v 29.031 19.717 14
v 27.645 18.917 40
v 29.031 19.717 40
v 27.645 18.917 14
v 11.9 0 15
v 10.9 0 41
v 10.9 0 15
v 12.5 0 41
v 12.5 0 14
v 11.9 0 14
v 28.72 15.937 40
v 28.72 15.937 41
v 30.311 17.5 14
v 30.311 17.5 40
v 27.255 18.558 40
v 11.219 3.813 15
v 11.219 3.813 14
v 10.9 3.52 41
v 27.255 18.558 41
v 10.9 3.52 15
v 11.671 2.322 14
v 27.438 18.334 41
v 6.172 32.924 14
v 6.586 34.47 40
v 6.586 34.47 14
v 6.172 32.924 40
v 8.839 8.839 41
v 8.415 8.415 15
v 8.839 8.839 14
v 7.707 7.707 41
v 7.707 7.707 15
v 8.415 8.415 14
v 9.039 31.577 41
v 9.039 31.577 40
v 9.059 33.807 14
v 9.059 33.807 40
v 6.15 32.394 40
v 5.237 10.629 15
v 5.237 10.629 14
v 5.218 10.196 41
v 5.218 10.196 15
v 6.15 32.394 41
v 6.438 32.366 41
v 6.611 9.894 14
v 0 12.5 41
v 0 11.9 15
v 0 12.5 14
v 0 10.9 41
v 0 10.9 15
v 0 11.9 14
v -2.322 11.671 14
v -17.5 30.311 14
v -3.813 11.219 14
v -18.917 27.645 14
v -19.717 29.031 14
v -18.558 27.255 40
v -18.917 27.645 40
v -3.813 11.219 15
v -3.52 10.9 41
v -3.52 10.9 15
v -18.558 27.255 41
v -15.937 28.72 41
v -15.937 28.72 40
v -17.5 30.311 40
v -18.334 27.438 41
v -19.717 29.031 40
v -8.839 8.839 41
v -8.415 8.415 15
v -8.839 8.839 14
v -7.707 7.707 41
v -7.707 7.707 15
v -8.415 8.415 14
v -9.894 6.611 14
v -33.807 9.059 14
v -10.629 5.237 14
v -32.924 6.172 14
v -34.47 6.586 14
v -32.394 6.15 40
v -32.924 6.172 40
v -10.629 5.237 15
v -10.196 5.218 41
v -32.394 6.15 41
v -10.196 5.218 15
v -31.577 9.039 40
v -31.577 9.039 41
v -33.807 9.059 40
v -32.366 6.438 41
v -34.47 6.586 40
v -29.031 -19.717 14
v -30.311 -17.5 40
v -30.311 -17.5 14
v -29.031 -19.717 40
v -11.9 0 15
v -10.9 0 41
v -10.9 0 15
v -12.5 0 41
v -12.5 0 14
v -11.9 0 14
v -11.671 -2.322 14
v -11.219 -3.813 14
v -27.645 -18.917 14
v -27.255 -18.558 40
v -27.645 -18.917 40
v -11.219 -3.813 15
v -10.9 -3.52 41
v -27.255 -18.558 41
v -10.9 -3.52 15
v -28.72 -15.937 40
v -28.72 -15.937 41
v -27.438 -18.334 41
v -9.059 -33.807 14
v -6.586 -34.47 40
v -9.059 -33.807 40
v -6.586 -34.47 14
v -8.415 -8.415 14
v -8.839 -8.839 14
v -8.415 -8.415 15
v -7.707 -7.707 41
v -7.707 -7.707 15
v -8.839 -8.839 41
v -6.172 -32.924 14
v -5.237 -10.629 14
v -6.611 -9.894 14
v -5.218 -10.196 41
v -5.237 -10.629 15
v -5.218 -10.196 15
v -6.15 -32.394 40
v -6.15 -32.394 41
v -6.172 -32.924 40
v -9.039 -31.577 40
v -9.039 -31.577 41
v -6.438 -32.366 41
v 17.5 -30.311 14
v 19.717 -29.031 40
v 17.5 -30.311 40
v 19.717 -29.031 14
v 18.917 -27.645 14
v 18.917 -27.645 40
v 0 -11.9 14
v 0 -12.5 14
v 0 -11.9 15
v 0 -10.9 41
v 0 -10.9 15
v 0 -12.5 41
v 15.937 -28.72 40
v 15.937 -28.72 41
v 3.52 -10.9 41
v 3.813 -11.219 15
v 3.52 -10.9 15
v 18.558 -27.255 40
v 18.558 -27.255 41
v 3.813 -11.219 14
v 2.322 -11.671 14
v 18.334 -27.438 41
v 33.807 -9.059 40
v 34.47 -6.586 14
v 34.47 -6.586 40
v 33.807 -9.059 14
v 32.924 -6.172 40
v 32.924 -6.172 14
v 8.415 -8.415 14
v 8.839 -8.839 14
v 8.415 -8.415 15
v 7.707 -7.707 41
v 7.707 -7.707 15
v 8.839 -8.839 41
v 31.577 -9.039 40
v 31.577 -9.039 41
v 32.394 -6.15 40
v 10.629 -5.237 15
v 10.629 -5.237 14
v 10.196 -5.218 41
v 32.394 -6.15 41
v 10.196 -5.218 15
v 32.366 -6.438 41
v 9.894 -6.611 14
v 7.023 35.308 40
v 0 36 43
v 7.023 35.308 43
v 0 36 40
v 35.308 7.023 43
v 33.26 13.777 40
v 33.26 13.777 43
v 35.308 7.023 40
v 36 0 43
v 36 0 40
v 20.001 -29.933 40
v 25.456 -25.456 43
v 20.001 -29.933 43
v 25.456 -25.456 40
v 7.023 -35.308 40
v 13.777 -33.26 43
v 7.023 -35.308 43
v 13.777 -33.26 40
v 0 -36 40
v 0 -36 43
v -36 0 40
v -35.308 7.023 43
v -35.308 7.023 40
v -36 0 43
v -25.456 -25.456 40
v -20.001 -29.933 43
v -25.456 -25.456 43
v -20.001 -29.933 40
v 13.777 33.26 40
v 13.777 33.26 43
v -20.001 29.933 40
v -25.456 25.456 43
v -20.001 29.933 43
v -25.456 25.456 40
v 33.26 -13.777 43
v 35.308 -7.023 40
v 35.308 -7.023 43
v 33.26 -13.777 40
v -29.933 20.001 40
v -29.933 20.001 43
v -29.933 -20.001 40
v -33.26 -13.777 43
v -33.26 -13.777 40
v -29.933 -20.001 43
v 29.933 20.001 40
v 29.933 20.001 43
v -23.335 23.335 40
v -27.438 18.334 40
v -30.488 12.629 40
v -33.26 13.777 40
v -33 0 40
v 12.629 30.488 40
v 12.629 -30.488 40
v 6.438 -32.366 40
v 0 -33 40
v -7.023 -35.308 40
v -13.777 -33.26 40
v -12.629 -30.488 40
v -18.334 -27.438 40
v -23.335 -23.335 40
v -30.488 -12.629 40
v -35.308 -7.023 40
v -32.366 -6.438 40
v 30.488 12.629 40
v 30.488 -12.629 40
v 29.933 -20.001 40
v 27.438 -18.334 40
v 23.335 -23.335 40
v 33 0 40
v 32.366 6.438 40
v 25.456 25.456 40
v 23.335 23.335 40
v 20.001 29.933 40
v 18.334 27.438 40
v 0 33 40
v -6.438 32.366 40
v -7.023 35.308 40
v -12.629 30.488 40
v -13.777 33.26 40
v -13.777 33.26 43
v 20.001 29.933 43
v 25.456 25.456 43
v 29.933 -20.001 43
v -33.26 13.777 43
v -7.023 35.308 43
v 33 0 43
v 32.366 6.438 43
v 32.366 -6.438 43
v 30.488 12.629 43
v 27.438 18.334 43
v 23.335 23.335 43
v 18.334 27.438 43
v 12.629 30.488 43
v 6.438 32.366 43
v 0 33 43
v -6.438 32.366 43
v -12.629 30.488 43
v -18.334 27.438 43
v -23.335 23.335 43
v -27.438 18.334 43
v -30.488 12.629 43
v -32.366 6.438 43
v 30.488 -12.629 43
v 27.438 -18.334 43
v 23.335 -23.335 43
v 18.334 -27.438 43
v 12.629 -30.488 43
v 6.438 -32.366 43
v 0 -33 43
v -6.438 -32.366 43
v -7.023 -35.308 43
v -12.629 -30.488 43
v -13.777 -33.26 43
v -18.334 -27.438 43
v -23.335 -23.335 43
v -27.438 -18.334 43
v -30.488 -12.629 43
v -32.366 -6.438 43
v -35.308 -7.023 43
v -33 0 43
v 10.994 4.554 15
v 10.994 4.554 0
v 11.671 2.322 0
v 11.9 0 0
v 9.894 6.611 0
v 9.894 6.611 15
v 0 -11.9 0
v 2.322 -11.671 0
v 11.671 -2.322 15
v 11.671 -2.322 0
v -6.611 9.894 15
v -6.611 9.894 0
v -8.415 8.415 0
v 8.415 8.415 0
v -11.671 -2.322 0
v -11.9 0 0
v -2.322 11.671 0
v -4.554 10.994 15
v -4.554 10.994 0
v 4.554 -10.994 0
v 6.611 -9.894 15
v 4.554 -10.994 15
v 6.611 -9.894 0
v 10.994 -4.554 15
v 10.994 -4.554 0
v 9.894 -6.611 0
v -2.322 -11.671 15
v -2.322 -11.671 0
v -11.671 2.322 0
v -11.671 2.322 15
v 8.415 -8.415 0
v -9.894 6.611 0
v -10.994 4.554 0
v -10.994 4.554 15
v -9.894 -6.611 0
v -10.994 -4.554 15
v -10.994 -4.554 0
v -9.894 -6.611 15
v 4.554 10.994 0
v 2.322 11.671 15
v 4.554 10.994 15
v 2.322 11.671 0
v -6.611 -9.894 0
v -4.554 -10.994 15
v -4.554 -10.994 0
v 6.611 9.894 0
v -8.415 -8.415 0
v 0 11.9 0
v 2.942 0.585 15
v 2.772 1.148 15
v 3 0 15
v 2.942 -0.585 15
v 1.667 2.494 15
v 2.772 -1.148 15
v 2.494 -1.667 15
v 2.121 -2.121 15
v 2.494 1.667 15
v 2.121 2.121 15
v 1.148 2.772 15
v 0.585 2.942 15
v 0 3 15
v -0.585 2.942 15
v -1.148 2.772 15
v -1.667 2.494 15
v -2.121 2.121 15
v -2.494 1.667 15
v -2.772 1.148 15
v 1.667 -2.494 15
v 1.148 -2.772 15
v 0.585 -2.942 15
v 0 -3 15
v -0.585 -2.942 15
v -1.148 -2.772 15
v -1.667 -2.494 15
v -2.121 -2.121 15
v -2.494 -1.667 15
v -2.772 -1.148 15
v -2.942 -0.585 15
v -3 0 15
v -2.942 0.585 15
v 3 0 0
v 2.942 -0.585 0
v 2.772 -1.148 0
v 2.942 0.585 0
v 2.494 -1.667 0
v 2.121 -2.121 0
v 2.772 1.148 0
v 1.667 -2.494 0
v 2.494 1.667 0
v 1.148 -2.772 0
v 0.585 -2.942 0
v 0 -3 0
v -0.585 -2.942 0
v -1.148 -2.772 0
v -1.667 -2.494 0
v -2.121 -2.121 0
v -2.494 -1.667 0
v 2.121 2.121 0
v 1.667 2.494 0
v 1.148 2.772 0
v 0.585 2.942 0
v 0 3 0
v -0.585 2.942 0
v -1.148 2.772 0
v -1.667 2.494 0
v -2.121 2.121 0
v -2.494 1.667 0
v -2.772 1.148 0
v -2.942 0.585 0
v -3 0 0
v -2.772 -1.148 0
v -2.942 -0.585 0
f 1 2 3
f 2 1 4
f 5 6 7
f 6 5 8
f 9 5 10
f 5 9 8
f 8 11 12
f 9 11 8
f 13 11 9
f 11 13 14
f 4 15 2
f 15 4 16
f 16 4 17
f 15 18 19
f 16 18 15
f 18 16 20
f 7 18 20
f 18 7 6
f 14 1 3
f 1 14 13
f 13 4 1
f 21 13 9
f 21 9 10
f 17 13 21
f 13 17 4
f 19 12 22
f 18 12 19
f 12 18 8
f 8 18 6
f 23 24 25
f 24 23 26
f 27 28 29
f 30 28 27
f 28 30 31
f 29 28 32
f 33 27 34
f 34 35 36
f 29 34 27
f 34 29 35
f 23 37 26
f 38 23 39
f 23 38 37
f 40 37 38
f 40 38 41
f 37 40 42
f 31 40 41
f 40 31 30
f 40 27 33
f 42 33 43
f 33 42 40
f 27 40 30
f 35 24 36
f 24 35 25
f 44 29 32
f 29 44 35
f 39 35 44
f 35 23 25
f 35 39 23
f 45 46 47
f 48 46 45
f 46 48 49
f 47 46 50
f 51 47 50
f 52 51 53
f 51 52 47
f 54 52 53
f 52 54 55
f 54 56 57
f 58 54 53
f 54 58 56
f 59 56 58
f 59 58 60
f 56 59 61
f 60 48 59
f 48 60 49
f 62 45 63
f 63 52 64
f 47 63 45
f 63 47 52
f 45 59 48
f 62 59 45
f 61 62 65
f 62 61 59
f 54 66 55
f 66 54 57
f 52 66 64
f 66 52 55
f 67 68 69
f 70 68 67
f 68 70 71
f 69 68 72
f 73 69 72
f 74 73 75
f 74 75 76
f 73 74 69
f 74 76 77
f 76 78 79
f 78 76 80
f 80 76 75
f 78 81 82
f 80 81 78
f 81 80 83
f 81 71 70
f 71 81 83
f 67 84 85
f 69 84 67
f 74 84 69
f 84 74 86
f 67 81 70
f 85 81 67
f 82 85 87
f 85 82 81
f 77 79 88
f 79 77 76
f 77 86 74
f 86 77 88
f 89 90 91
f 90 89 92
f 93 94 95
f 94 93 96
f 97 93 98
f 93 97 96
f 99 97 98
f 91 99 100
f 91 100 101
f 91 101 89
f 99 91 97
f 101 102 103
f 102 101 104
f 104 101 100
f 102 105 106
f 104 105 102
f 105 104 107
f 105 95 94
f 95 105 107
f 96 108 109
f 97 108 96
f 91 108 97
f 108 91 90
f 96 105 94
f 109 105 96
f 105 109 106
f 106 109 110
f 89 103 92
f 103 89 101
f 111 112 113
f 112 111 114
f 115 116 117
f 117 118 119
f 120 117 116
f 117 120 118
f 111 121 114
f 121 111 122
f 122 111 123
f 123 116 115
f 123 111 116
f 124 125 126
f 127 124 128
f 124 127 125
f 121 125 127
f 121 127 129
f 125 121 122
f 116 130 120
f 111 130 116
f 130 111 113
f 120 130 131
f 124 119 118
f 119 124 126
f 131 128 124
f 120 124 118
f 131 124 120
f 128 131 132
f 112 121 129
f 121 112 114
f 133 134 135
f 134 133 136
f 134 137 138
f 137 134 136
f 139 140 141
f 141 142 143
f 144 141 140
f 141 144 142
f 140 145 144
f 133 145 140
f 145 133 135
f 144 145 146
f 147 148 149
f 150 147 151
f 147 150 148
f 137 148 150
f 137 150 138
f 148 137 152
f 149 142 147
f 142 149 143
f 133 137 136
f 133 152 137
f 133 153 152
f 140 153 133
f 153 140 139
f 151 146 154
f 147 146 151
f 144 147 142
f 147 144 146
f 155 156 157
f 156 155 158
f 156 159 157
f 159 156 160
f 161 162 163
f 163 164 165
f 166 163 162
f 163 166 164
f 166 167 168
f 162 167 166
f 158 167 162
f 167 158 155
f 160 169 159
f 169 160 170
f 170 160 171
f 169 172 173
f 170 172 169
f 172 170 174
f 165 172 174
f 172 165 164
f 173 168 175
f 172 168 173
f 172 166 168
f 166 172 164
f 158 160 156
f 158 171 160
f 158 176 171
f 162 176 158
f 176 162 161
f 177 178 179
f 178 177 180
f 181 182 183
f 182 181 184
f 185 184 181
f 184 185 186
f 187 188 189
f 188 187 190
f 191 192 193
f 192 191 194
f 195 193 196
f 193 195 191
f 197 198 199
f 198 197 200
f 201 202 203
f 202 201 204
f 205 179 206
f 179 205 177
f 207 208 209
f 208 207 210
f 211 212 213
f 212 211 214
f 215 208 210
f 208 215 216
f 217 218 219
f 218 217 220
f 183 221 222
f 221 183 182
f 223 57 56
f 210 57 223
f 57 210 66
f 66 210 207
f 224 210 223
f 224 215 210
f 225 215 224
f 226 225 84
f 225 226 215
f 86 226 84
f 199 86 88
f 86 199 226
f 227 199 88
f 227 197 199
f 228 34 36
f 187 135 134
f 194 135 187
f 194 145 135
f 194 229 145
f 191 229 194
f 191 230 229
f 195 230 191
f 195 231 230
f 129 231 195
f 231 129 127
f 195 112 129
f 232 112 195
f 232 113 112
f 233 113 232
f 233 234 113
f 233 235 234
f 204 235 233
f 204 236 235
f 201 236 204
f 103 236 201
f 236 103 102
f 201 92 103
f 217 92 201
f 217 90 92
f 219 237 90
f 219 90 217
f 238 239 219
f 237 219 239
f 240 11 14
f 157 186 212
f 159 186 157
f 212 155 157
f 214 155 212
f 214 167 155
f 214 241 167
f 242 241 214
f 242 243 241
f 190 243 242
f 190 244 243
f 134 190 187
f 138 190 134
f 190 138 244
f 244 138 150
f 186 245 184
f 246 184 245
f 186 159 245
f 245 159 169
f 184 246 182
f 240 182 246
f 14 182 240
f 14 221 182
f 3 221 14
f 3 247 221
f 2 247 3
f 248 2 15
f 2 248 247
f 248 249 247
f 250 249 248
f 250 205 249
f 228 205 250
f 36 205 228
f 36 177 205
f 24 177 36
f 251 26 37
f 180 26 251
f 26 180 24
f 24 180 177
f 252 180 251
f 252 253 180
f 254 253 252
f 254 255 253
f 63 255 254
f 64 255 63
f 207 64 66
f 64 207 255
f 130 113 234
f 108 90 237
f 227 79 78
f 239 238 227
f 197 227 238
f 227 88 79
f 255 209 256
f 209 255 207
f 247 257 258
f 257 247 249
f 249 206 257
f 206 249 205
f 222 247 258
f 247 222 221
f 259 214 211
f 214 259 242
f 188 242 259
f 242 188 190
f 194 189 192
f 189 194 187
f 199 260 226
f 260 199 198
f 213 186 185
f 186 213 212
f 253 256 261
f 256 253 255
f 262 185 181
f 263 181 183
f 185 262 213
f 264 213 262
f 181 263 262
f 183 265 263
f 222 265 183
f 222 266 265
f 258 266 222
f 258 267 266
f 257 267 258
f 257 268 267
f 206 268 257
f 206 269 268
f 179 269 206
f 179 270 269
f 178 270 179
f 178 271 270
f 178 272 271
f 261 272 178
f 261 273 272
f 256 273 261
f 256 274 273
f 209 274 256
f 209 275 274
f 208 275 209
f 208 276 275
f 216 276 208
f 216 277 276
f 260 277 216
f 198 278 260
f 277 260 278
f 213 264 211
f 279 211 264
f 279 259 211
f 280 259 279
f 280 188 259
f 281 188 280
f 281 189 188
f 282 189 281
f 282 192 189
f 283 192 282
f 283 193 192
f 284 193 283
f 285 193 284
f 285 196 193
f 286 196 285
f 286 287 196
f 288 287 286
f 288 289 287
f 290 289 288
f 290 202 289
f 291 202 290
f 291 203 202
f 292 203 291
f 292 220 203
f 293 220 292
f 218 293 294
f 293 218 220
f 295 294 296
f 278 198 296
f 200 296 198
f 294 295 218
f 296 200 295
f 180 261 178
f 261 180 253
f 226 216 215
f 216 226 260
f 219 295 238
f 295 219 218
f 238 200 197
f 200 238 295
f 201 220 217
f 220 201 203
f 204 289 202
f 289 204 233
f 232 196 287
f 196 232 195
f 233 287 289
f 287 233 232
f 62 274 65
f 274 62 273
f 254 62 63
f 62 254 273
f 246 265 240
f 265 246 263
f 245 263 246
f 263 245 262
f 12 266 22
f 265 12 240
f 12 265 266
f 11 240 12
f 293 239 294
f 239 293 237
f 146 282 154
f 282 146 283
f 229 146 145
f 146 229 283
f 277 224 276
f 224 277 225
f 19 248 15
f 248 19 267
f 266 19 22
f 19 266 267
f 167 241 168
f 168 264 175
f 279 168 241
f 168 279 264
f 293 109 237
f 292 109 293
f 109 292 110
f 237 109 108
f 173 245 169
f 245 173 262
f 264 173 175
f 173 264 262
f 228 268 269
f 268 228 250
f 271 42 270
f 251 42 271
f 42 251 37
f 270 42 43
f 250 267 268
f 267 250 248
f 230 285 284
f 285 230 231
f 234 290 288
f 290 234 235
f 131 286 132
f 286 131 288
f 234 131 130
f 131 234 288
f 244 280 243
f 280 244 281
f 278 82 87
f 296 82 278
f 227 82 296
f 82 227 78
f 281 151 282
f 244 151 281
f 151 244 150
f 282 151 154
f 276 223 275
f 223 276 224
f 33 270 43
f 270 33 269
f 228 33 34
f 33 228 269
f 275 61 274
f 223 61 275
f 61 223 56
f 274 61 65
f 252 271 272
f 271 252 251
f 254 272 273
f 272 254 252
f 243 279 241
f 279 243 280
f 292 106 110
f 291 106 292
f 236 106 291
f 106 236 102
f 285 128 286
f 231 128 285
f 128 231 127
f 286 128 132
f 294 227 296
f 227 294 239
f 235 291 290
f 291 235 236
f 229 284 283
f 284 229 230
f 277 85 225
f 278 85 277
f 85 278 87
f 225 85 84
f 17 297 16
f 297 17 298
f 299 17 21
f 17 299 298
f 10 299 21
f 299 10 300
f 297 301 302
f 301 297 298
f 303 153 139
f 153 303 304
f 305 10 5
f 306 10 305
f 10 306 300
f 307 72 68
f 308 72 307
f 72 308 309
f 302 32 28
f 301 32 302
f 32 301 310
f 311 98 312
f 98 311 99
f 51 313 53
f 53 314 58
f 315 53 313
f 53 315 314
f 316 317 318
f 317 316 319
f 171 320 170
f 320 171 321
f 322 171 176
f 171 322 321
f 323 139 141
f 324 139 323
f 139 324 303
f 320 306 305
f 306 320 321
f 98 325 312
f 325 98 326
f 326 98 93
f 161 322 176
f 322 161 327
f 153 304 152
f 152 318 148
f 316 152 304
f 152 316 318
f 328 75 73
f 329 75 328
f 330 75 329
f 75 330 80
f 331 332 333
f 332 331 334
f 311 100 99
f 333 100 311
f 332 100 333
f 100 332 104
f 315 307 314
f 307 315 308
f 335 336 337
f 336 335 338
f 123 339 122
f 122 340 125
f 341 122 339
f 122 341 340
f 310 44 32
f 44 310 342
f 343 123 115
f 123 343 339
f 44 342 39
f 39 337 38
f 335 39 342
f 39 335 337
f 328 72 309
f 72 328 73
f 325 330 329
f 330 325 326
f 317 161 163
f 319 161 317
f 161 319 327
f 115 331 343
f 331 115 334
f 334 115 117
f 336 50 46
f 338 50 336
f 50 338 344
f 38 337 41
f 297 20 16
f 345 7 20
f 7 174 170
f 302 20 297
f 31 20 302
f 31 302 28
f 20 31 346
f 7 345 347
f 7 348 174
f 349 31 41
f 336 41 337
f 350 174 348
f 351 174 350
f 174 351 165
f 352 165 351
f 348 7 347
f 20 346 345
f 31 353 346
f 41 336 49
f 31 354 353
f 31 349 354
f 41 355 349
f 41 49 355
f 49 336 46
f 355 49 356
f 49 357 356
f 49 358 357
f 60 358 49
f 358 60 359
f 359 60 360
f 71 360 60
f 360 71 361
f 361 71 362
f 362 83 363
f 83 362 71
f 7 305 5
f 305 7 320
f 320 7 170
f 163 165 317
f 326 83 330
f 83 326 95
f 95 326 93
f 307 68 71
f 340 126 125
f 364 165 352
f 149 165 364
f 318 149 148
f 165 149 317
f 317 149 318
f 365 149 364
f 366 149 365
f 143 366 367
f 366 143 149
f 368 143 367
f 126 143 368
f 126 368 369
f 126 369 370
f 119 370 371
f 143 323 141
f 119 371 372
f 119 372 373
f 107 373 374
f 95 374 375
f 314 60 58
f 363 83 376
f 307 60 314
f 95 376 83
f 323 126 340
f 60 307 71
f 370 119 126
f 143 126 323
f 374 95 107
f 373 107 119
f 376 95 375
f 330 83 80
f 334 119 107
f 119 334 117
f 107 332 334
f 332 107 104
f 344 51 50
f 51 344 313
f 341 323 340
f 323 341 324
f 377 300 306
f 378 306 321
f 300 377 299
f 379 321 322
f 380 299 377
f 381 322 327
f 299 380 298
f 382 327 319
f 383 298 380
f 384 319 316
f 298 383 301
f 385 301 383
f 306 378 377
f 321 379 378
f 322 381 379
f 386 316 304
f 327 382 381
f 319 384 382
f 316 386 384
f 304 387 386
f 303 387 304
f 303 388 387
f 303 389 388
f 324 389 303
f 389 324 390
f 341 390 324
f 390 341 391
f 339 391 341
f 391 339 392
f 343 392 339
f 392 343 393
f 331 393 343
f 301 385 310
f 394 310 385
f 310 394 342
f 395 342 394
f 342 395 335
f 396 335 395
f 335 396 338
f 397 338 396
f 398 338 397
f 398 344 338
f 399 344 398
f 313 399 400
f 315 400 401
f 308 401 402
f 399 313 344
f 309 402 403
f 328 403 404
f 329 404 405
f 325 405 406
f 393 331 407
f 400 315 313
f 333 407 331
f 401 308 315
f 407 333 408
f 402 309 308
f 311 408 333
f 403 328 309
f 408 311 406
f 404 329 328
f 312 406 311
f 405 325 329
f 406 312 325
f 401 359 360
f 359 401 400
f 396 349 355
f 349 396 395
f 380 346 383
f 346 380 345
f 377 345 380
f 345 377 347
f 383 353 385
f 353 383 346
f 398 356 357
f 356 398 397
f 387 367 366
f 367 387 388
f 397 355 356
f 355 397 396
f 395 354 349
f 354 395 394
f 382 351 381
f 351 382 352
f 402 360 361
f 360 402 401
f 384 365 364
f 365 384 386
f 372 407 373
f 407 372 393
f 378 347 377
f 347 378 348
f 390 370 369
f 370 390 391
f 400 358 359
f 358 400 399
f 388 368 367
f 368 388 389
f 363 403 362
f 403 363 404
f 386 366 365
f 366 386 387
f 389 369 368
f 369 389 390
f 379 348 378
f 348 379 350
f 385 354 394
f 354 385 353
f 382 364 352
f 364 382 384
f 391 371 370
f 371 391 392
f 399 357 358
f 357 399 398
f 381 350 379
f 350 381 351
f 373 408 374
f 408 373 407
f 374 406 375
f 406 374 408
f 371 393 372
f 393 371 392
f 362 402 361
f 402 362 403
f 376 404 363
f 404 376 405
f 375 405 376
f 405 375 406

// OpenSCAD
$fn = 32;

// ----------------------------------------------------------------------
// Impeller: 70 mm, 8 blades, 43 mm tall
// ----------------------------------------------------------------------

// --- parameters (mm) ---
center_d = 23.8;          // hub diameter
center_h = 15;            // hub height
wheel_d = 70;             // outer diameter over the blades
blade_count = 8;          // number of blades
blade_t = 1.6;            // blade thickness
blade_h = 26;             // blade height
blade_in_r = 10.9;        // blade root radius
blade_out_r = 33.4;       // blade tip radius
sweep = 30;               // blade sweep, degrees
bore_d = 6;               // shaft bore
shroud_h = 2;             // shroud ring thickness
shroud_d = 72;            // shroud outside diameter

module hub() {
  cylinder(h = center_h, d = center_d);
}

module blade() {
  /* blade swept between two boxes: hull of the root and the tip section */
  hull() {
    translate([blade_in_r, 0, center_h - 1])
      cube([blade_t, blade_t * 2.2, blade_h + 1], center = false);
    rotate([0, 0, sweep])
      translate([blade_out_r, 0, center_h - 1])
        cube([blade_t, blade_t * 1.6, blade_h + 1], center = false);
  }
}

module blades() {
  for (i = [0 : blade_count - 1])
    rotate([0, 0, i * 360 / blade_count]) blade();
}

module shroud() {
  translate([0, 0, center_h + blade_h - 1])
    difference() {
      cylinder(h = shroud_h + 1, d = shroud_d);
      translate([0, 0, -1]) cylinder(h = shroud_h + 3, d = shroud_d - 2 * 3);
    }
}

difference() {
  union() {
    hub();
    blades();
    shroud();
  }
  translate([0, 0, -1]) cylinder(h = center_h + blade_h + shroud_h + 3, d = bore_d);
}
